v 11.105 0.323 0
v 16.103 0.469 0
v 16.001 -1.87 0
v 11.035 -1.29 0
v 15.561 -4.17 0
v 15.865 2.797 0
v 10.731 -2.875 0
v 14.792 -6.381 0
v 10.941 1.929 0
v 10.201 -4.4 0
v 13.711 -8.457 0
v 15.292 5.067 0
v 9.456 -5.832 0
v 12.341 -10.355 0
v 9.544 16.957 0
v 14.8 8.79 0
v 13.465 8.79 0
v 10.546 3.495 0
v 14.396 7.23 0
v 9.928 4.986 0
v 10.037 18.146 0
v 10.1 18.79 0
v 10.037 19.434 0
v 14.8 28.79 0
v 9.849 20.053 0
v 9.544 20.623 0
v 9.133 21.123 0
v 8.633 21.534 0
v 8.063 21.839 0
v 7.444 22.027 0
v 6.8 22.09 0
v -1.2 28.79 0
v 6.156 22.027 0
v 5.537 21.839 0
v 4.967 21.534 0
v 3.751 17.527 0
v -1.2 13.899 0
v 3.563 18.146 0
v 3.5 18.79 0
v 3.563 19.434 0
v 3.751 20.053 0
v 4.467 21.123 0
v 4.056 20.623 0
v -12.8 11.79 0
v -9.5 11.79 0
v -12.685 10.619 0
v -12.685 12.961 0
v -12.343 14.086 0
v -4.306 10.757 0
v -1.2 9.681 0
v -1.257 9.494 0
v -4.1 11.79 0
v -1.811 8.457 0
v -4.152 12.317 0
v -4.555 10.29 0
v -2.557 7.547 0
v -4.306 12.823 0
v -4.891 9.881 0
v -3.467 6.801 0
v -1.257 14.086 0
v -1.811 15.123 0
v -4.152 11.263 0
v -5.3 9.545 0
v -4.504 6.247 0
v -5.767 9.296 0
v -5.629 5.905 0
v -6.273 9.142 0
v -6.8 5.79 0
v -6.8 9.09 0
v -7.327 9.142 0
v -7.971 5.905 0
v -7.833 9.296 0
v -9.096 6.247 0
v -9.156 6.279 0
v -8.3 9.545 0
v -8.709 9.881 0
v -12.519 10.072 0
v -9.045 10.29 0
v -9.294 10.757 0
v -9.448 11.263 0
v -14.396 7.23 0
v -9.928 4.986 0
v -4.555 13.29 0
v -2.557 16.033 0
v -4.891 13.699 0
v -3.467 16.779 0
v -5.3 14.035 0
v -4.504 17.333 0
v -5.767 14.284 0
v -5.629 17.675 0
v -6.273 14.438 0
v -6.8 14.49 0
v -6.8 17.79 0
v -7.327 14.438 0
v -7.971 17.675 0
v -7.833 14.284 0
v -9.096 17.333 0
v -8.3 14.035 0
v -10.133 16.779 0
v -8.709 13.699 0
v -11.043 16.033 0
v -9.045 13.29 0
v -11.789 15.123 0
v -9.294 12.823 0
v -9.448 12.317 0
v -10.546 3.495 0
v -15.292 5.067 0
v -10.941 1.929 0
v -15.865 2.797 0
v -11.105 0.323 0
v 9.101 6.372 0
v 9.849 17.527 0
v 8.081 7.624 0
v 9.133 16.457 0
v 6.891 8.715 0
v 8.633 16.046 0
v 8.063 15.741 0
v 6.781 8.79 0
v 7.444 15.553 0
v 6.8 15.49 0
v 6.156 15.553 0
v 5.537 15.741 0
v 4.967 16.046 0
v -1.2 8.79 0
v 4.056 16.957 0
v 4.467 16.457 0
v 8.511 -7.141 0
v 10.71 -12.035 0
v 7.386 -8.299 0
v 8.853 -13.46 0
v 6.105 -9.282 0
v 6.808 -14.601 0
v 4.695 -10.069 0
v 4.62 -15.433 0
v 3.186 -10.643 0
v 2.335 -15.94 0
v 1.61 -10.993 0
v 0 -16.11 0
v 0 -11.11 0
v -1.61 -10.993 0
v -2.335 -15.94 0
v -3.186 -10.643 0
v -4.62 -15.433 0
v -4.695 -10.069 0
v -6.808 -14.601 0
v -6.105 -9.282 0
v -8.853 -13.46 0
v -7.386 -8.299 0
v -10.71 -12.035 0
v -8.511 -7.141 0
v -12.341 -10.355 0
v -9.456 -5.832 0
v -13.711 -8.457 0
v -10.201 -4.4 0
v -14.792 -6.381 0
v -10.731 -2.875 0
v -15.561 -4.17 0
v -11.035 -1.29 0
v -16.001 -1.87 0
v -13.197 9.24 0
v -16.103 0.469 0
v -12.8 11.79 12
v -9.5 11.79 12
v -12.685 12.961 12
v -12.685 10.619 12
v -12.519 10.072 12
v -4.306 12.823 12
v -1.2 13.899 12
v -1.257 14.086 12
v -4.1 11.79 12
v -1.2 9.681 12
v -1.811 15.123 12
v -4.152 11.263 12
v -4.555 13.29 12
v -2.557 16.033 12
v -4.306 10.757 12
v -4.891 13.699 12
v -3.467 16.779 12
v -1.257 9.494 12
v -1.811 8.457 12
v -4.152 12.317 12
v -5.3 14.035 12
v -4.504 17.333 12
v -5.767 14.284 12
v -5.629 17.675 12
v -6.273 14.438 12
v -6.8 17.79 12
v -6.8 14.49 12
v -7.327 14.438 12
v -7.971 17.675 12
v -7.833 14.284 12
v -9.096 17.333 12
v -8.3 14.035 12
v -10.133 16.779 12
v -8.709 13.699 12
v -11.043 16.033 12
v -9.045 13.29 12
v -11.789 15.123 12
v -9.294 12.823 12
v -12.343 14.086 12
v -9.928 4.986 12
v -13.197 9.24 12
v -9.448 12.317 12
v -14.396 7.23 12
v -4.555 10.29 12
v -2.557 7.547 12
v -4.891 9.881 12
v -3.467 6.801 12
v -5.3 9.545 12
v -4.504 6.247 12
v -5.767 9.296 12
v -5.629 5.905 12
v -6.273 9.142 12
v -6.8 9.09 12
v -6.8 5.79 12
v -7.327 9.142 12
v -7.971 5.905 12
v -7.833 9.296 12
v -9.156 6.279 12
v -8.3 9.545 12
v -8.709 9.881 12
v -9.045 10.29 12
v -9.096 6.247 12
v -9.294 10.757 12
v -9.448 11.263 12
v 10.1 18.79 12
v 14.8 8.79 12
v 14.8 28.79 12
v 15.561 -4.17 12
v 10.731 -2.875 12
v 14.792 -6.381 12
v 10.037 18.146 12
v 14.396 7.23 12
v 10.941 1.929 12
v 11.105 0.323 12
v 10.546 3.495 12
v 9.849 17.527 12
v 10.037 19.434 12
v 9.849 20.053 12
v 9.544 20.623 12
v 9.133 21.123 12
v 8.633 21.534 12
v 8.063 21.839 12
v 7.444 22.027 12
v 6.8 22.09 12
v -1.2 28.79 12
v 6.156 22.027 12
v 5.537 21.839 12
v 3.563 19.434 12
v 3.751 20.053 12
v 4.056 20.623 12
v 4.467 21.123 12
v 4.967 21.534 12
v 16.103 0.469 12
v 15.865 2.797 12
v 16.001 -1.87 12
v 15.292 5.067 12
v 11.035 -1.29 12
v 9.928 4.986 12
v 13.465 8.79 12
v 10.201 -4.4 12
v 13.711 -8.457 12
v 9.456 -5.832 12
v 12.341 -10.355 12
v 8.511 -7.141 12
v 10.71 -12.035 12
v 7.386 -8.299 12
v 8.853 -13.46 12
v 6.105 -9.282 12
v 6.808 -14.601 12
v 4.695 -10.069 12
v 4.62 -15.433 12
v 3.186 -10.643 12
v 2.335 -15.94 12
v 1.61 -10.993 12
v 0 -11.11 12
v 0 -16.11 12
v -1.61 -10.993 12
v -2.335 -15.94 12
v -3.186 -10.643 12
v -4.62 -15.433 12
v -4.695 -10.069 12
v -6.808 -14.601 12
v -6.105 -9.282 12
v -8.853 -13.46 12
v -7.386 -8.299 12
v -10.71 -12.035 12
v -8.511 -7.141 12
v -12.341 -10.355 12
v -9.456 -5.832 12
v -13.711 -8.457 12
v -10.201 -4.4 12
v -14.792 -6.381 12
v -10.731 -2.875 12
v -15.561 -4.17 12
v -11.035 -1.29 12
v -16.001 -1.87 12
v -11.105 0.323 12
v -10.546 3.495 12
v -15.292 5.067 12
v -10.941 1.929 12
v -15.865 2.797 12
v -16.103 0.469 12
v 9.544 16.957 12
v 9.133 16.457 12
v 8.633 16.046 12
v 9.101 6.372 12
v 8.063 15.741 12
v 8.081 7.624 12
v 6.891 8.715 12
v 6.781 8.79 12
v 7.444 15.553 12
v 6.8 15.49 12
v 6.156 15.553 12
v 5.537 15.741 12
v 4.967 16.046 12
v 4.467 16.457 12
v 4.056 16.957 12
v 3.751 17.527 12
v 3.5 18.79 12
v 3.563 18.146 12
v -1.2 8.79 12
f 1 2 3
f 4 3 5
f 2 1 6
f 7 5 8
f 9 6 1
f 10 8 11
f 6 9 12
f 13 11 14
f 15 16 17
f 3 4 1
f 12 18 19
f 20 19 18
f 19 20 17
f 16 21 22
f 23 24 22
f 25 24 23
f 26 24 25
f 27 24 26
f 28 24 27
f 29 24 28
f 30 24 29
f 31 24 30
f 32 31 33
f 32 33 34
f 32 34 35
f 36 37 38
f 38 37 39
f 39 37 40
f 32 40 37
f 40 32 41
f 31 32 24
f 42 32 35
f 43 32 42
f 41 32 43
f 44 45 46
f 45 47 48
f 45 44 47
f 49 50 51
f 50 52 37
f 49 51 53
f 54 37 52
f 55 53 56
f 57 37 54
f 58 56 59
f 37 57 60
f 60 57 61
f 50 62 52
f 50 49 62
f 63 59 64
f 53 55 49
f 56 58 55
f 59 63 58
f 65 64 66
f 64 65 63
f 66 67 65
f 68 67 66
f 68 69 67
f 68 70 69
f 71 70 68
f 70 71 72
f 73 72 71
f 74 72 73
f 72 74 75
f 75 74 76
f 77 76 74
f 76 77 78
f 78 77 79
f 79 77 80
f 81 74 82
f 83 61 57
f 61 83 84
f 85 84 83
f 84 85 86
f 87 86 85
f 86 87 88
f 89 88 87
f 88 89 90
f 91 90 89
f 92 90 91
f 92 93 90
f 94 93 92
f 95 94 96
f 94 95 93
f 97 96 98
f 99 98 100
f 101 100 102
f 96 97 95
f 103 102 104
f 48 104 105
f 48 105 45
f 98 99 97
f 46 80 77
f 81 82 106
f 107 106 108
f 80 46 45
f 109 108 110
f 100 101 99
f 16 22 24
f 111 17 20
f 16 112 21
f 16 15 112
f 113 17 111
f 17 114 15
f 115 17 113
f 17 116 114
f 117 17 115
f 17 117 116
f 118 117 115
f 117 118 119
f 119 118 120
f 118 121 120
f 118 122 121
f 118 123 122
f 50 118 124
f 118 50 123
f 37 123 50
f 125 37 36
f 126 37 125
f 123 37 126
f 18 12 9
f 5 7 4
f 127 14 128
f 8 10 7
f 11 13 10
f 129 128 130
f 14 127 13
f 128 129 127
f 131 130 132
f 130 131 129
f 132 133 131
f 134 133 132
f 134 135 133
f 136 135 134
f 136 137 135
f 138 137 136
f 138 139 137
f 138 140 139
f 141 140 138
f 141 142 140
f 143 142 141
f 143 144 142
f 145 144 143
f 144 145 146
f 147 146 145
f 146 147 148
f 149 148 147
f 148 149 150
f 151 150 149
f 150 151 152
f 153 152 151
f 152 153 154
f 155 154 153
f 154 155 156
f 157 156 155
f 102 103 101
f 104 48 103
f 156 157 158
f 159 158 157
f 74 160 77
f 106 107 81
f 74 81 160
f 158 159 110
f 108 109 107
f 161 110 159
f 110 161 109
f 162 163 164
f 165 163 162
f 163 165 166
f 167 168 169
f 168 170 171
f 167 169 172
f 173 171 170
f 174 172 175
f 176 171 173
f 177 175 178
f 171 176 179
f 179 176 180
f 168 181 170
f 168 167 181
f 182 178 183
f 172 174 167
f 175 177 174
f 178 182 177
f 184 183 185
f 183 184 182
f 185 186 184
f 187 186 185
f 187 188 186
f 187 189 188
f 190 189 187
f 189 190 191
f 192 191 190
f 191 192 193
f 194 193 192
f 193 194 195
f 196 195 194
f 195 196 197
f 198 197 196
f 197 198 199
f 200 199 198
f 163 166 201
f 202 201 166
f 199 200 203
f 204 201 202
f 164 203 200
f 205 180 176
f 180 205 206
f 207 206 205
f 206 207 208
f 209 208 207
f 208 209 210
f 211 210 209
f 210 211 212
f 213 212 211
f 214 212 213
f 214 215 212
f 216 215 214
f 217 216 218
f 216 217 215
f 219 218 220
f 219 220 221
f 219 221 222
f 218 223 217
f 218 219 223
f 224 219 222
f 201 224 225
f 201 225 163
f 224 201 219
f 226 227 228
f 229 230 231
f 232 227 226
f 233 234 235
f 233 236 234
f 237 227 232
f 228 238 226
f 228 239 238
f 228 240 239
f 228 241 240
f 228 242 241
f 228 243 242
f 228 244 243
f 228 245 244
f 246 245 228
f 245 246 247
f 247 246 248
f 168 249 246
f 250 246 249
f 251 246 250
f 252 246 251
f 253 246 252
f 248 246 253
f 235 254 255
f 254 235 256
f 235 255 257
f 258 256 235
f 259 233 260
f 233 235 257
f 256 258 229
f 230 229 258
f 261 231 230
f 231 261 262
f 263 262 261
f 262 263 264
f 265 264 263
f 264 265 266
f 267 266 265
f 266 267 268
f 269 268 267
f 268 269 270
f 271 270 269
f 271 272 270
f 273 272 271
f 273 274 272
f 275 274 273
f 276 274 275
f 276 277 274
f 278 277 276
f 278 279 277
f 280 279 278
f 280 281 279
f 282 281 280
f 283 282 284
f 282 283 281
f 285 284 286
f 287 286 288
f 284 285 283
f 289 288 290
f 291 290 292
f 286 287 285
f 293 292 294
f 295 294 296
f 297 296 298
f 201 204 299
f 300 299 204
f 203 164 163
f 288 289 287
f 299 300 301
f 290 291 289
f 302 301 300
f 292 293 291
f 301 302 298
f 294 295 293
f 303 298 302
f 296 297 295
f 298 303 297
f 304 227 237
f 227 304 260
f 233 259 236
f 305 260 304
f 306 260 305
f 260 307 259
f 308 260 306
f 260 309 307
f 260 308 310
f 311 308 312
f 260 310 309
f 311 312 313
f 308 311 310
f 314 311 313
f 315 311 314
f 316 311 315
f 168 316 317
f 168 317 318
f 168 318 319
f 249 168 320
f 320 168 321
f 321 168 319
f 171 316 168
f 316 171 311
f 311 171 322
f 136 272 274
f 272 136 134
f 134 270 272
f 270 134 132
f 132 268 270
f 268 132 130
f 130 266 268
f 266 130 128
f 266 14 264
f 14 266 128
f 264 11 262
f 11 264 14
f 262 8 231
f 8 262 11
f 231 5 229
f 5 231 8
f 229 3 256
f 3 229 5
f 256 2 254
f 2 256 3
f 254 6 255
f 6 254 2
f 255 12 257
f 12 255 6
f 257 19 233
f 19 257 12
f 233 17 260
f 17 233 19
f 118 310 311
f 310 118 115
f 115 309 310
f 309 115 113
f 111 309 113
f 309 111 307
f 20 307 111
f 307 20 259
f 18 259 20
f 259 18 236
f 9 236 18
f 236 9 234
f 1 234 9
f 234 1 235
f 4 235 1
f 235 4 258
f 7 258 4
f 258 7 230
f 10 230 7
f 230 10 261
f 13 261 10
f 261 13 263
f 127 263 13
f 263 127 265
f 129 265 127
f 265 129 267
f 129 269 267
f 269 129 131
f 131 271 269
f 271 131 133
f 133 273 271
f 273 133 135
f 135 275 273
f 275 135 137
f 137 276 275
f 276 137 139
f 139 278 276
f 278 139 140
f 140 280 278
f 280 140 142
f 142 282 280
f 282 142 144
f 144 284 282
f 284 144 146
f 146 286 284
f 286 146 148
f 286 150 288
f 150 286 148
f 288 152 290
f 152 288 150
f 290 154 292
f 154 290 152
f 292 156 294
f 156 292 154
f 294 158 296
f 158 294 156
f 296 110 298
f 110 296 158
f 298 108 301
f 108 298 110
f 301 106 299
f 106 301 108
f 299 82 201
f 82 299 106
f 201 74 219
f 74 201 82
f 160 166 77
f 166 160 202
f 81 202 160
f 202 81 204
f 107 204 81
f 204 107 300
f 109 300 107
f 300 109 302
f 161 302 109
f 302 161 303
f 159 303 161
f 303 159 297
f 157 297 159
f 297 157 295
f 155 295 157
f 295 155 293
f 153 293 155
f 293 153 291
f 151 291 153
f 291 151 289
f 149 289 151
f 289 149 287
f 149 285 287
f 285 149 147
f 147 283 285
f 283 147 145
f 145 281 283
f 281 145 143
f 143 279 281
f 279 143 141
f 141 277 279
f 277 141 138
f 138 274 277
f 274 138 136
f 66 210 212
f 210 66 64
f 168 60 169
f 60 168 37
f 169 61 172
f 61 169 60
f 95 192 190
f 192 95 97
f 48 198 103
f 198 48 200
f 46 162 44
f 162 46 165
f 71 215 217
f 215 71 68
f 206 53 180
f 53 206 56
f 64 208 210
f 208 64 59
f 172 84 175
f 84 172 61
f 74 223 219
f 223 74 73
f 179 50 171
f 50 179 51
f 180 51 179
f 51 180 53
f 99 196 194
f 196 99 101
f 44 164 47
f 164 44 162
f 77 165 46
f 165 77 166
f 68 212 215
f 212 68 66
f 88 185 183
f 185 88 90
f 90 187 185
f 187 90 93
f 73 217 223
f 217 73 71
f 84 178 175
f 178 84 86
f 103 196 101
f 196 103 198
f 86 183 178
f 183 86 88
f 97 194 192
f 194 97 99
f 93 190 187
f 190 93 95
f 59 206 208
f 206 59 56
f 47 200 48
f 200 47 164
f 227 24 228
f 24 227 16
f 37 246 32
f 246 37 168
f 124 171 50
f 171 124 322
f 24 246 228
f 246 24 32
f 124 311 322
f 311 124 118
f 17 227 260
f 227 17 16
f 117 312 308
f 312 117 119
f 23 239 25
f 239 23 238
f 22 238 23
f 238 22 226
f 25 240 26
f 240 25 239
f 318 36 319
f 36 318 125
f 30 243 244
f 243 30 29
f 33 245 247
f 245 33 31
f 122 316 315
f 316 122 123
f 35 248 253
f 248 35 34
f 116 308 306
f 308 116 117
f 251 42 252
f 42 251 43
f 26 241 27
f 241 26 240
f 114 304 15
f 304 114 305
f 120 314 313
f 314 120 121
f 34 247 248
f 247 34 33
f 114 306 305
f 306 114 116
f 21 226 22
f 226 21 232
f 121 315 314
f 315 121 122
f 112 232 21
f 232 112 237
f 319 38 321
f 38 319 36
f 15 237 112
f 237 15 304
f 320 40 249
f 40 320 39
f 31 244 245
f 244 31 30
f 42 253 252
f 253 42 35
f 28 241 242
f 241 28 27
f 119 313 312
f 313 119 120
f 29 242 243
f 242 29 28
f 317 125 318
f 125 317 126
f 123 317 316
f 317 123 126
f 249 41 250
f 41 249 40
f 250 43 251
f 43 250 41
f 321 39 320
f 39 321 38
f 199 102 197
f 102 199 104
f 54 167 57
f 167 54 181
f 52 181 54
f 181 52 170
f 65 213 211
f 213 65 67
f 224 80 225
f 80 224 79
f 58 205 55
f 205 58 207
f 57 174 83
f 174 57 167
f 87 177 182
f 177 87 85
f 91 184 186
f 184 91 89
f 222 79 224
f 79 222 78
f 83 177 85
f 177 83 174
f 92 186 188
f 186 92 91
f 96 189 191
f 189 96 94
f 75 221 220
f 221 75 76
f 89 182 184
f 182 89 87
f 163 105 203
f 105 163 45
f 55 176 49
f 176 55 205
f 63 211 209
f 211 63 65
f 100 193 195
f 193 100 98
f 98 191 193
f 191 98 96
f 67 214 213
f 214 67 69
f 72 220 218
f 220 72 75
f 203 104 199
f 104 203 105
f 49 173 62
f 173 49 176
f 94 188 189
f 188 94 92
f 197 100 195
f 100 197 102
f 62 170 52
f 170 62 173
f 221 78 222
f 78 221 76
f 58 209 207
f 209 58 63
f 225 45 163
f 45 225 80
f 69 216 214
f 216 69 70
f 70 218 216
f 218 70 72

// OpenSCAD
$fn = 32;

// ----------------------------------------------------------------------
// Pipe clamp: 32.22 mm ring, 5 mm wall, 12 mm wide
// ----------------------------------------------------------------------

// --- parameters (mm) ---
outer_r = 16.11;          // clamp outside radius
inner_r = 11.11;          // pipe bore radius
band = 5;                 // band thickness
clamp_w = 12;             // clamp width
opening = 60;             // opening angle between the ends
lug_w = 16;               // lug width
lug_len = 20;             // lug length
bolt_d = 6.6;             // bolt hole
knuckle_d = 12;           // hinge knuckle diameter
pin_d = 5.4;              // hinge pin hole

clamp_profile = [[-8.055, 13.952], [-9.992, 12.637], [-11.718, 11.055], [-13.197, 9.24], [-14.396, 7.23], [-15.292, 5.067], [-15.865, 2.797], [-16.103, 0.469], [-16.001, -1.87], [-15.561, -4.17], [-14.792, -6.381], [-13.711, -8.457], [-12.341, -10.355], [-10.71, -12.035], [-8.853, -13.46], [-6.808, -14.601], [-4.62, -15.433], [-2.335, -15.94], [0, -16.11], [2.335, -15.94], [4.62, -15.433], [6.808, -14.601], [8.853, -13.46], [10.71, -12.035], [12.341, -10.355], [13.711, -8.457], [14.792, -6.381], [15.561, -4.17], [16.001, -1.87], [16.103, 0.469], [15.865, 2.797], [15.292, 5.067], [14.396, 7.23], [13.197, 9.24], [11.718, 11.055], [9.992, 12.637], [8.055, 13.952], [5.555, 9.622], [6.891, 8.715], [8.081, 7.624], [9.101, 6.372], [9.928, 4.986], [10.546, 3.495], [10.941, 1.929], [11.105, 0.323], [11.035, -1.29], [10.731, -2.875], [10.201, -4.4], [9.456, -5.832], [8.511, -7.141], [7.386, -8.299], [6.105, -9.282], [4.695, -10.069], [3.186, -10.643], [1.61, -10.993], [0, -11.11], [-1.61, -10.993], [-3.186, -10.643], [-4.695, -10.069], [-6.105, -9.282], [-7.386, -8.299], [-8.511, -7.141], [-9.456, -5.832], [-10.201, -4.4], [-10.731, -2.875], [-11.035, -1.29], [-11.105, 0.323], [-10.941, 1.929], [-10.546, 3.495], [-9.928, 4.986], [-9.101, 6.372], [-8.081, 7.624], [-6.891, 8.715], [-5.555, 9.622]];

difference() {
  union() {
    linear_extrude(height = clamp_w) polygon(clamp_profile);
    /* hinge knuckle, sunk 2 mm into the band end */
    translate([-6.8, 11.79, 0]) cylinder(h = clamp_w, d = knuckle_d);
    /* bolt lug on the other end */
    translate([-1.2, 8.79, 0]) cube([lug_w, 20, clamp_w]);
  }
  translate([6.8, 18.79, -2.5]) cylinder(h = clamp_w + 5, d = bolt_d);
  translate([-6.8, 11.79, -2.5]) cylinder(h = clamp_w + 5, d = pin_d);
}
